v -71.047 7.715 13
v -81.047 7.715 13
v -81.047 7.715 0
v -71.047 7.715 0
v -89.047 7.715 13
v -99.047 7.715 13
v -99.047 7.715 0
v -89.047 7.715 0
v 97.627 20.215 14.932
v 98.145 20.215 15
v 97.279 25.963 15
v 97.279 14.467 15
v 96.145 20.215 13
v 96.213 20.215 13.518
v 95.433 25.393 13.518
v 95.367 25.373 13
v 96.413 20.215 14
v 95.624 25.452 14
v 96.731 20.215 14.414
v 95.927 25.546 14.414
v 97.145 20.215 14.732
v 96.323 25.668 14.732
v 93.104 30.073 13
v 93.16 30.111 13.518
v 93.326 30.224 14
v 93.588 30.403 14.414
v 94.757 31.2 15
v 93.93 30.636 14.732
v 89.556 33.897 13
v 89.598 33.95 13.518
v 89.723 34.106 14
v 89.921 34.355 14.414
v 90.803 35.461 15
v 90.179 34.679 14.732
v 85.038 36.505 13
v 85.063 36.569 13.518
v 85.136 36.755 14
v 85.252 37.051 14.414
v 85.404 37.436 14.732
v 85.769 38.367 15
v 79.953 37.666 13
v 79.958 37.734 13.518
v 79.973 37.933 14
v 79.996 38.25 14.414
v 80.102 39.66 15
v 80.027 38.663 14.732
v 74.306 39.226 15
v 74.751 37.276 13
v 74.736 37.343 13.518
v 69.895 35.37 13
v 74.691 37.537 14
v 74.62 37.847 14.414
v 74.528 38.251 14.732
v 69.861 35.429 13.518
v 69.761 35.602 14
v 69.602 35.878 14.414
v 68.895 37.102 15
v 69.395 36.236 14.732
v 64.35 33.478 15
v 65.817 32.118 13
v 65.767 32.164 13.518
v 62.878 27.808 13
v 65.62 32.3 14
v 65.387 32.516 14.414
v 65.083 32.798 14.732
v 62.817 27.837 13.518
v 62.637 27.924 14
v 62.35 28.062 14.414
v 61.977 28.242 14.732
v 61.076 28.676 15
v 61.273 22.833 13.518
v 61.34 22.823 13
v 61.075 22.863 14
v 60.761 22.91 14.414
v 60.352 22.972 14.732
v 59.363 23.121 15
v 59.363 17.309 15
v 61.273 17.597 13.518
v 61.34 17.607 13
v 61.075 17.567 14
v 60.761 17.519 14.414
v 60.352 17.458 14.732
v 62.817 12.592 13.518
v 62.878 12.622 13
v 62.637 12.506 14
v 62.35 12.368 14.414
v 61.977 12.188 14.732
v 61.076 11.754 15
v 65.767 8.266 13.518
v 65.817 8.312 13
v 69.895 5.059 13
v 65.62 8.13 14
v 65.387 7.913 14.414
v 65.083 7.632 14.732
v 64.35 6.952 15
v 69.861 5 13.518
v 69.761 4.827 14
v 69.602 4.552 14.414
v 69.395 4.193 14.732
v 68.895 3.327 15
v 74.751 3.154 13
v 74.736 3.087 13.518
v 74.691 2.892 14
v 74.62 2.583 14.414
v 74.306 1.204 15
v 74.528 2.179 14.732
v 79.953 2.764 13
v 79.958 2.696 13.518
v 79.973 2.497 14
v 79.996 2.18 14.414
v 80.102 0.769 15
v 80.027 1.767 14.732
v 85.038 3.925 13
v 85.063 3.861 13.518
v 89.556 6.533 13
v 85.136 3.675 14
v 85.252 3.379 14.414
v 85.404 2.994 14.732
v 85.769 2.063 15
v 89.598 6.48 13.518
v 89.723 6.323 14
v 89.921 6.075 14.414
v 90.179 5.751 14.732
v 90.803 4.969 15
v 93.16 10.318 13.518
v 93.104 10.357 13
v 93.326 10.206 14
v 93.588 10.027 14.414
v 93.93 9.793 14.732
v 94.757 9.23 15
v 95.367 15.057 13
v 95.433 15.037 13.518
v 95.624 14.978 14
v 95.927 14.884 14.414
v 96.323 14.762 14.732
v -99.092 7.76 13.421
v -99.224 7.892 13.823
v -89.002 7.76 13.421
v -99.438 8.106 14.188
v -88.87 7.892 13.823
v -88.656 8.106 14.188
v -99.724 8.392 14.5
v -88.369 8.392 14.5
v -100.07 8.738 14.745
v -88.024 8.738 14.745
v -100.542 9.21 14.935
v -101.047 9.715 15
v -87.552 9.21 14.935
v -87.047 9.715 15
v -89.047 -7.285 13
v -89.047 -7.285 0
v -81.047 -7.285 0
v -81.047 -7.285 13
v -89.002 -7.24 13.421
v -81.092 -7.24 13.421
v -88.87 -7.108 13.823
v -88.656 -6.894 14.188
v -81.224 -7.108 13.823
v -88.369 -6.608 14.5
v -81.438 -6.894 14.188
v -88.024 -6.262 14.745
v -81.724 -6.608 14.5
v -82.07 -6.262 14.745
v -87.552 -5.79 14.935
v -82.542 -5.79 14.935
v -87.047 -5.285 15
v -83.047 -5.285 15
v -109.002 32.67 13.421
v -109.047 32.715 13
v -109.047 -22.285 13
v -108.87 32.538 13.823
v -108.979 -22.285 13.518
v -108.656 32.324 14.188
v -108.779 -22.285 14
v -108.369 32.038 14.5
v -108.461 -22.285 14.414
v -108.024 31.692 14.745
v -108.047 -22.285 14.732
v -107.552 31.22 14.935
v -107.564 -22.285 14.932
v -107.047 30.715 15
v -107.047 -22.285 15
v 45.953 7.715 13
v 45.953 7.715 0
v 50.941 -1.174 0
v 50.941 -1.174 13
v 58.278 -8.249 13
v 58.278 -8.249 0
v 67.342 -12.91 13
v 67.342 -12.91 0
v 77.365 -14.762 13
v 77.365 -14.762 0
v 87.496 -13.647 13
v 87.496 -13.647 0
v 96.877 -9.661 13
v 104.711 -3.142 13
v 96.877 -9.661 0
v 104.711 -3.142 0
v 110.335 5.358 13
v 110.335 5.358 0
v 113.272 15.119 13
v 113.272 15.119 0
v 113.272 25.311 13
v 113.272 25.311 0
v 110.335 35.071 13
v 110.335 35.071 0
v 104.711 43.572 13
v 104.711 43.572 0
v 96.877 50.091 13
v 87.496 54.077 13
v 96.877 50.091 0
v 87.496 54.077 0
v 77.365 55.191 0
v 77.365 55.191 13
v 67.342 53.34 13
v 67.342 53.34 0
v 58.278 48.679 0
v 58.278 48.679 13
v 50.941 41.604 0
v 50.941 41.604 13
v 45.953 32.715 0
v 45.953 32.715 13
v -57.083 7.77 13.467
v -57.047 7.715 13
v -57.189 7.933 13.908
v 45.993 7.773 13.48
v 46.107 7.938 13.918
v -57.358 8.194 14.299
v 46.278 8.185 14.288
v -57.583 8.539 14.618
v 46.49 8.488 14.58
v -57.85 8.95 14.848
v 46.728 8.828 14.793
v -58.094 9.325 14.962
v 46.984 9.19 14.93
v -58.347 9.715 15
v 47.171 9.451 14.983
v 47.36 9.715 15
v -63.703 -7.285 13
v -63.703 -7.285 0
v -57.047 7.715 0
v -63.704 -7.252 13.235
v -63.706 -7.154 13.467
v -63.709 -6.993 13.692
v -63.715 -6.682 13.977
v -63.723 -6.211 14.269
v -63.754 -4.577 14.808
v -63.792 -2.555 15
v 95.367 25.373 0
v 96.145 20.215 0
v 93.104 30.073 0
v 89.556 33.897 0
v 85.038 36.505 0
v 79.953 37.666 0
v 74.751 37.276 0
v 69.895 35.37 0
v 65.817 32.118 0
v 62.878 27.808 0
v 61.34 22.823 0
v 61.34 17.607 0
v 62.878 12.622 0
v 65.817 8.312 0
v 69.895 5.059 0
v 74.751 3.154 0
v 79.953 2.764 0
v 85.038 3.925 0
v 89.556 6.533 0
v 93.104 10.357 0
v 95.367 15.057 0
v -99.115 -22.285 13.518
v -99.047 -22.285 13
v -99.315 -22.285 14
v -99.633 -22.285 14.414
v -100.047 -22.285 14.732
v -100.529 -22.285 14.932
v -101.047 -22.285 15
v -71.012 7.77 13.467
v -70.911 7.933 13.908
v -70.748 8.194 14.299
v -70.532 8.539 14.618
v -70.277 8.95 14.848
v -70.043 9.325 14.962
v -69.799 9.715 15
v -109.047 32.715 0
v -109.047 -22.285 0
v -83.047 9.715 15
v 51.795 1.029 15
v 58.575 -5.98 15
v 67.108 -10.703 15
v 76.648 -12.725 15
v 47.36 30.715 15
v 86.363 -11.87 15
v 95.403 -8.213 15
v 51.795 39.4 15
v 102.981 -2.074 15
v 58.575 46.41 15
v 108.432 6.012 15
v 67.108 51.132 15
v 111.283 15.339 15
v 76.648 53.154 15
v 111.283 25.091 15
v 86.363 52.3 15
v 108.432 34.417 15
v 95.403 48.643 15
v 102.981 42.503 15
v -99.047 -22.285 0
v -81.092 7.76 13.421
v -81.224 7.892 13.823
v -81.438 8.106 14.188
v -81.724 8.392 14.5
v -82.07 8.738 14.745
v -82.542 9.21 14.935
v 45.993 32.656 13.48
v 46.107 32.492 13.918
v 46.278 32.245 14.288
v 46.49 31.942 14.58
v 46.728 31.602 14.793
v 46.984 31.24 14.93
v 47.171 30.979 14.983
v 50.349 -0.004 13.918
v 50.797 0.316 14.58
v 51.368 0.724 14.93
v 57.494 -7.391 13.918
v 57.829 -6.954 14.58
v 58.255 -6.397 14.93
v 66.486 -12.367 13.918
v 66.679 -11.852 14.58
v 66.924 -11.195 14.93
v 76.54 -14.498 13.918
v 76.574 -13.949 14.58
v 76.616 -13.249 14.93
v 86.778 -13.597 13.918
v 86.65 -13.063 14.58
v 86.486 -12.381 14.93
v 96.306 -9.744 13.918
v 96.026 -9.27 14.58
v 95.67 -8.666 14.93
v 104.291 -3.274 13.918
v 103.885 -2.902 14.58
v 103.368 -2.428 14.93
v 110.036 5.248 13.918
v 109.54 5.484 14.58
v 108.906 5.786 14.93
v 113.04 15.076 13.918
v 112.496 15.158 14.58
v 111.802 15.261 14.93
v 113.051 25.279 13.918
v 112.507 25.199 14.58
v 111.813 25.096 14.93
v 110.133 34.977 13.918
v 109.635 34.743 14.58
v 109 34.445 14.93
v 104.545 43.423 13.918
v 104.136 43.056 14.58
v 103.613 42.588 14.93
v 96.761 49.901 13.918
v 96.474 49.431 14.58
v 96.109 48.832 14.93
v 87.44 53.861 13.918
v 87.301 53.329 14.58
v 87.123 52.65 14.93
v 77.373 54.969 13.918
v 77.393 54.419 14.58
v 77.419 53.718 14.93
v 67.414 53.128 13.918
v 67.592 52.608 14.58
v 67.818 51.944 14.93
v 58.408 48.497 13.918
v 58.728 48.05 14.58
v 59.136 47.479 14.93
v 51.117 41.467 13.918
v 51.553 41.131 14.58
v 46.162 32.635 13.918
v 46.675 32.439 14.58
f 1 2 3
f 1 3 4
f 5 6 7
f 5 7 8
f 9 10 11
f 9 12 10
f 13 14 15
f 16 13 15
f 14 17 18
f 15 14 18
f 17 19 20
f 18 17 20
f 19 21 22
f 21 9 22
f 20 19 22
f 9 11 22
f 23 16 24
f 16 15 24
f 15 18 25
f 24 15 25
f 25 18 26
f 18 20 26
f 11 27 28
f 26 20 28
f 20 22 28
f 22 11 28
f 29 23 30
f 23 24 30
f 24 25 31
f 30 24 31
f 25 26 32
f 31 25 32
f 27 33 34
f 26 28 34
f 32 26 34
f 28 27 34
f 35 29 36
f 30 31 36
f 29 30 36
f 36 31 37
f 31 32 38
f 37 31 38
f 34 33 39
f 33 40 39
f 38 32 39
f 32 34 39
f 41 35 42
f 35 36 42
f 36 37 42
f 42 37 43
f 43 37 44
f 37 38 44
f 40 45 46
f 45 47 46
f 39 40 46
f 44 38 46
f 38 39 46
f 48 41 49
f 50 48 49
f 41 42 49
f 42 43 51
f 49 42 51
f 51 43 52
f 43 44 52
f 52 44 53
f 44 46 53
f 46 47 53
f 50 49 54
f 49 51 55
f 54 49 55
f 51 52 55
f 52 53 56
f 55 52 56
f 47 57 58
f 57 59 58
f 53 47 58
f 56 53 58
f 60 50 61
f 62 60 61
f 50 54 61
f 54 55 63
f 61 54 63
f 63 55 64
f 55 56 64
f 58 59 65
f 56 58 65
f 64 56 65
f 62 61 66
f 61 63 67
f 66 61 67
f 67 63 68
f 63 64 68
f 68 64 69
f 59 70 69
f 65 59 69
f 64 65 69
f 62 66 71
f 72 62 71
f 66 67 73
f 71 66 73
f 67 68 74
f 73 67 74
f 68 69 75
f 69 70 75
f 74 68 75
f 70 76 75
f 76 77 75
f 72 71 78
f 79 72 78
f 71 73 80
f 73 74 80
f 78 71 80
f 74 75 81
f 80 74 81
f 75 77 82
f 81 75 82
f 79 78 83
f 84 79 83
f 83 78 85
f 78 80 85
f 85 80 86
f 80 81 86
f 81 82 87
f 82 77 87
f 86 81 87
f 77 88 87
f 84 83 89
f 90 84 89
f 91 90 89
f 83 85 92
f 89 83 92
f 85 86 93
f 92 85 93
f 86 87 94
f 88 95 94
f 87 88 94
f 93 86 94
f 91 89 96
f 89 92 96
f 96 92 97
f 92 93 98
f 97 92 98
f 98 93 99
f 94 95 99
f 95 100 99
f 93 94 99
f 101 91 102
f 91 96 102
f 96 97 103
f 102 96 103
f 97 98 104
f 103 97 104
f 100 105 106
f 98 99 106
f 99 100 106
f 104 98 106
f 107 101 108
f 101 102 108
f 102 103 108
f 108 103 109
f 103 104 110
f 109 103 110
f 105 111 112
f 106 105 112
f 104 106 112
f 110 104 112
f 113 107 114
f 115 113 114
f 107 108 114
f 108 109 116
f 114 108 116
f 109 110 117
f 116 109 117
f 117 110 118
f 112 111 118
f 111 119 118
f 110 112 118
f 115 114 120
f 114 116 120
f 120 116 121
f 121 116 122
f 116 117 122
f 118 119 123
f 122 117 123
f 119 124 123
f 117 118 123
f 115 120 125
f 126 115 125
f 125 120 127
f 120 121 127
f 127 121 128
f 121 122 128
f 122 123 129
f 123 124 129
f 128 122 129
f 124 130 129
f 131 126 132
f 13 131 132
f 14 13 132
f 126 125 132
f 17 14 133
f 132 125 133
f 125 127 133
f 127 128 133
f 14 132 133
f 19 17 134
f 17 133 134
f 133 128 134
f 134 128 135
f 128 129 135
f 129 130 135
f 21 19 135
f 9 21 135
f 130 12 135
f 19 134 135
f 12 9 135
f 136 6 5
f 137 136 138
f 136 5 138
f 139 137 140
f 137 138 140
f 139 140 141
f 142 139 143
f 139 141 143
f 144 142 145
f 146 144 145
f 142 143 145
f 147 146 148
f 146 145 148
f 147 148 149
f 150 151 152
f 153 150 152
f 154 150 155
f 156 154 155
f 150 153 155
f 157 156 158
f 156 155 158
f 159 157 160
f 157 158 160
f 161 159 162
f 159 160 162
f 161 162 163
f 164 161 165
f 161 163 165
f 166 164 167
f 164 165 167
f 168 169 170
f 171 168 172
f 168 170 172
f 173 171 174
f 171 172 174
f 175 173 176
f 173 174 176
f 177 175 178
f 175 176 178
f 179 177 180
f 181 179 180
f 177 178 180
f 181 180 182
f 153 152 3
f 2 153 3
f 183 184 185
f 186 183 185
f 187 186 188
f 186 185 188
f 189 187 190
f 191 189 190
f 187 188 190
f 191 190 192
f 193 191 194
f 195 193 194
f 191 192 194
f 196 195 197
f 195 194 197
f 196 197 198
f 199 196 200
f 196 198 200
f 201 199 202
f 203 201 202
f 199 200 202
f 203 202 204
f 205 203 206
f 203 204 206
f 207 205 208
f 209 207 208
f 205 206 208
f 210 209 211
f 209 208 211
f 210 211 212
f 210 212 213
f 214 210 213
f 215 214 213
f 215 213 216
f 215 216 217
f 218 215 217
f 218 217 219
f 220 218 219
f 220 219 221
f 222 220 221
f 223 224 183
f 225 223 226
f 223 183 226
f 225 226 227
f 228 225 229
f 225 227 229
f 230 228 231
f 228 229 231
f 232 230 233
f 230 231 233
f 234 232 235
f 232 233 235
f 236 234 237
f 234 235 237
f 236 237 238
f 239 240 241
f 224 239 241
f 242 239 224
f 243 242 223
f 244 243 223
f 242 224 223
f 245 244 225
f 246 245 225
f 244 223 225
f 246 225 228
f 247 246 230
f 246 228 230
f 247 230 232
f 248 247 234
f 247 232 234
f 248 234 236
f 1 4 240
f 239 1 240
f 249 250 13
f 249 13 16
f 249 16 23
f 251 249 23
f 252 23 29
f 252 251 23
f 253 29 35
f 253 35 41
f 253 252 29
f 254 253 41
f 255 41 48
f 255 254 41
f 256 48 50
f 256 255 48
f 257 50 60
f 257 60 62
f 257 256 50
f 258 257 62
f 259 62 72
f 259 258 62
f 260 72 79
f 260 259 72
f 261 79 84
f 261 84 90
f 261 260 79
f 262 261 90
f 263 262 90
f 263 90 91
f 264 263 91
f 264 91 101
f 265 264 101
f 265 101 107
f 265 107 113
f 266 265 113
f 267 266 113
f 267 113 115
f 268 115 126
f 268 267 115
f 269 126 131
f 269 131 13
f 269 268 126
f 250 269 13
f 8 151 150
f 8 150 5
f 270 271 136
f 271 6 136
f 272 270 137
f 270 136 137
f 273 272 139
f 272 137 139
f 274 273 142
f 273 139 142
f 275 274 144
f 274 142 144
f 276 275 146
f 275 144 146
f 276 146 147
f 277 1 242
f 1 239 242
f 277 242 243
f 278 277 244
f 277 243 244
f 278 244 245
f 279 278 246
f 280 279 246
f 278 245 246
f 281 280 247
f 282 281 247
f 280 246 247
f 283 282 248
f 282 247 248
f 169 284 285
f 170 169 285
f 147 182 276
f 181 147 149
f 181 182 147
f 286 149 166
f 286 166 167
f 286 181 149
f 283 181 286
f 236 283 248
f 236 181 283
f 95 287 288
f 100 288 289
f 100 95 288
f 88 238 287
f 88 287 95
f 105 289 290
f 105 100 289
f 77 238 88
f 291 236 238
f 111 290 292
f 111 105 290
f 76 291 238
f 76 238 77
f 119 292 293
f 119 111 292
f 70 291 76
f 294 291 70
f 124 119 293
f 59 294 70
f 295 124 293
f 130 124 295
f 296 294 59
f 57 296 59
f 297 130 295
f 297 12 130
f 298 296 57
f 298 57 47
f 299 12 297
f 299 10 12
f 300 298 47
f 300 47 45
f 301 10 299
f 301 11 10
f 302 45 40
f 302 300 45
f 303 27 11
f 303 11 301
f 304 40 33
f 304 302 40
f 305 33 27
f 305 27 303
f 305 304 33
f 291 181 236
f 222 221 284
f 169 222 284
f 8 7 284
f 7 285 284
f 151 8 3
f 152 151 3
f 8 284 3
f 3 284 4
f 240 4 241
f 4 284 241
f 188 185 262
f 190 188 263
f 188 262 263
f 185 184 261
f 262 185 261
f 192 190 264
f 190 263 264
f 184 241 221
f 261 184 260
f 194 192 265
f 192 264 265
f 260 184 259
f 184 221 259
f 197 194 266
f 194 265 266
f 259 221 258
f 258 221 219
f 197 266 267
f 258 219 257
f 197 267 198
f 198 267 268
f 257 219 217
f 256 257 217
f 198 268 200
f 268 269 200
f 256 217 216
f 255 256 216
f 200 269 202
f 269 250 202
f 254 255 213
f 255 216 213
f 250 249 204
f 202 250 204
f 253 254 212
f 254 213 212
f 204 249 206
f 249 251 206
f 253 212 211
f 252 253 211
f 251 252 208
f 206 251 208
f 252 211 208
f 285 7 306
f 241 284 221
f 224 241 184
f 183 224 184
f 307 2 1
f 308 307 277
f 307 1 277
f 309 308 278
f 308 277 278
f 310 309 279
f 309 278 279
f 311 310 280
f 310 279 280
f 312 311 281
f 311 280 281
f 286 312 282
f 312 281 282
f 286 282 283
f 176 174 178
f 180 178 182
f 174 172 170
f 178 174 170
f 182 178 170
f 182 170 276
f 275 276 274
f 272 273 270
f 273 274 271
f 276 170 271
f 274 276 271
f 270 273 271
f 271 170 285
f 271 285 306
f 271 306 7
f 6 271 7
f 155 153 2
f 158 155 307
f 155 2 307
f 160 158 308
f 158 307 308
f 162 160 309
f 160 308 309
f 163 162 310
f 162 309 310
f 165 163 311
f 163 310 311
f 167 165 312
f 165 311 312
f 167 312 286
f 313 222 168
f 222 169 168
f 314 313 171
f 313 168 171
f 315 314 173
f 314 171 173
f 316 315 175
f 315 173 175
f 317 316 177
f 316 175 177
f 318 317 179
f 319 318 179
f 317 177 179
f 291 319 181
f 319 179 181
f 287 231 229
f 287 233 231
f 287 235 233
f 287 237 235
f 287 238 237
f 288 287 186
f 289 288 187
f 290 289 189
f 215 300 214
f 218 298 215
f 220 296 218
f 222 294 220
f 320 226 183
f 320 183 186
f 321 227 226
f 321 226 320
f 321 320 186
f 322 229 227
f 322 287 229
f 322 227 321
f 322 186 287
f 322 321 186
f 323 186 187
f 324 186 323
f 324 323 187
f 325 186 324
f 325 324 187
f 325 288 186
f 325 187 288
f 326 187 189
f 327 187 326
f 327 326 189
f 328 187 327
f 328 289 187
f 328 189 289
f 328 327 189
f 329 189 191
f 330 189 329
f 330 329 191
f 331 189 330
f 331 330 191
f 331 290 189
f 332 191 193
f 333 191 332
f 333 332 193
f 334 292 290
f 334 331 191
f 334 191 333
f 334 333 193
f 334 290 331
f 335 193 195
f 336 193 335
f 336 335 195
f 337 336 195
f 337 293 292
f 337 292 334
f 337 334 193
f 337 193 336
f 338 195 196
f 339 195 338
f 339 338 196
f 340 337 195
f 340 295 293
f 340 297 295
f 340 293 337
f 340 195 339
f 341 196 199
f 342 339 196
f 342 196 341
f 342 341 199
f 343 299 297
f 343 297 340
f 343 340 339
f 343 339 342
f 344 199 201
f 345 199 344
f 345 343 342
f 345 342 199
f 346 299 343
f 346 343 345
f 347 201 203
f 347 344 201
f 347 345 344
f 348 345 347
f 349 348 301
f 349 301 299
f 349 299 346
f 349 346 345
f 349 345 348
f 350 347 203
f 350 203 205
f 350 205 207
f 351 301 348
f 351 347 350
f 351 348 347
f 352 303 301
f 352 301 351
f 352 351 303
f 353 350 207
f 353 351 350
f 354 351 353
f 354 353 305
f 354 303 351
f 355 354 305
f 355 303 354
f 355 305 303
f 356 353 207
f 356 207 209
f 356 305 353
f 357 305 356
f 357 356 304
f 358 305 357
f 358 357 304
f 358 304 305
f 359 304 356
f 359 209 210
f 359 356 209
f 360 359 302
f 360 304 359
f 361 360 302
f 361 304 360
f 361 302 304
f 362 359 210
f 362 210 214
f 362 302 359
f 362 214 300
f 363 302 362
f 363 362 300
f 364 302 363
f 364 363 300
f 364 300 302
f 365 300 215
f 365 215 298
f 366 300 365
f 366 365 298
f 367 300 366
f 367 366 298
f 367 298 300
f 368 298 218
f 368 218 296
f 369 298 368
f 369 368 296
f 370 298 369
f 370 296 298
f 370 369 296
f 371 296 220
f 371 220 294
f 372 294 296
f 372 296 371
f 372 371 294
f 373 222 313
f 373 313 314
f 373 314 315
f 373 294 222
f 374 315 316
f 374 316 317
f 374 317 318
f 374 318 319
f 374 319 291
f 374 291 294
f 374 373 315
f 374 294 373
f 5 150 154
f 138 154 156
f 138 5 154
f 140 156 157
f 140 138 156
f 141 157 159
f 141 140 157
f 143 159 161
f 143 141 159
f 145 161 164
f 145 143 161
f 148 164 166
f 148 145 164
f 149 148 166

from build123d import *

# Parameters (mm, degrees)
F0_R     = 17.5
F0_W     = 10
F0_H     = 30
F0_W_2   = 8
F0_H_2   = 15
F1_DEPTH = 15
F2_R     = 2


with BuildPart() as f1:
    # F0 (on Top) → F1 (new body)
    with BuildSketch(Plane.XY):
        Polygon((-109.0468041226, 32.7149193907), (-109.0468041226, 7.7149193907), (-99.0468041226, 7.7149193907), (-89.0468041226, 7.7149193907), (-81.0468041226, 7.7149193907), (-71.0468041226, 7.7149193907), (-57.0468041226, 7.7149193907), (45.9531958774, 7.7149193907), (45.9531958774, 32.7149193907), align=None)
        with BuildLine():
            ThreePointArc((45.9531958774, 7.7149193907), (113.6449379539, 20.2149193907), (45.9531958774, 32.7149193907))
            Line((45.9531958774, 32.7149193907), (45.9531958774, 7.7149193907))
        make_face()
        with Locations((78.6449379539, 20.2149193907)):
            Circle(F0_R, mode=Mode.SUBTRACT)
        with Locations((-104.0468041226, -7.2850806093)):
            Rectangle(F0_W, F0_H)
        with Locations((-85.0468041226, 0.2149193907)):
            Rectangle(F0_W_2, F0_H_2)
        Polygon((-57.0468041226, 7.7149193907), (-71.0468041226, 7.7149193907), (-63.7032017112, -7.2850806093), align=None)
    extrude(amount=F1_DEPTH)

    # F2
    f2_edges = [f1.edges().sort_by_distance(p)[0] for p in [
        (-109.046804, 5.214919, 15),
        (-31.546804, 32.714919, 15),
        (-99.046804, -7.285081, 15),
        (-94.046804, 7.714919, 15),
        (-85.046804, -7.285081, 15),
        (-76.046804, 7.714919, 15),
        (-67.375003, 0.214919, 15),
        (-5.546804, 7.714919, 15),
        (113.644938, 20.214919, 15),
        (61.144938, 20.214919, 15),
        (-60.375003, 0.214919, 15),
        (-81.046804, 0.214919, 15),
        (-89.046804, 0.214919, 15),
    ]]
    fillet(f2_edges, radius=F2_R)


solid = f1.part
